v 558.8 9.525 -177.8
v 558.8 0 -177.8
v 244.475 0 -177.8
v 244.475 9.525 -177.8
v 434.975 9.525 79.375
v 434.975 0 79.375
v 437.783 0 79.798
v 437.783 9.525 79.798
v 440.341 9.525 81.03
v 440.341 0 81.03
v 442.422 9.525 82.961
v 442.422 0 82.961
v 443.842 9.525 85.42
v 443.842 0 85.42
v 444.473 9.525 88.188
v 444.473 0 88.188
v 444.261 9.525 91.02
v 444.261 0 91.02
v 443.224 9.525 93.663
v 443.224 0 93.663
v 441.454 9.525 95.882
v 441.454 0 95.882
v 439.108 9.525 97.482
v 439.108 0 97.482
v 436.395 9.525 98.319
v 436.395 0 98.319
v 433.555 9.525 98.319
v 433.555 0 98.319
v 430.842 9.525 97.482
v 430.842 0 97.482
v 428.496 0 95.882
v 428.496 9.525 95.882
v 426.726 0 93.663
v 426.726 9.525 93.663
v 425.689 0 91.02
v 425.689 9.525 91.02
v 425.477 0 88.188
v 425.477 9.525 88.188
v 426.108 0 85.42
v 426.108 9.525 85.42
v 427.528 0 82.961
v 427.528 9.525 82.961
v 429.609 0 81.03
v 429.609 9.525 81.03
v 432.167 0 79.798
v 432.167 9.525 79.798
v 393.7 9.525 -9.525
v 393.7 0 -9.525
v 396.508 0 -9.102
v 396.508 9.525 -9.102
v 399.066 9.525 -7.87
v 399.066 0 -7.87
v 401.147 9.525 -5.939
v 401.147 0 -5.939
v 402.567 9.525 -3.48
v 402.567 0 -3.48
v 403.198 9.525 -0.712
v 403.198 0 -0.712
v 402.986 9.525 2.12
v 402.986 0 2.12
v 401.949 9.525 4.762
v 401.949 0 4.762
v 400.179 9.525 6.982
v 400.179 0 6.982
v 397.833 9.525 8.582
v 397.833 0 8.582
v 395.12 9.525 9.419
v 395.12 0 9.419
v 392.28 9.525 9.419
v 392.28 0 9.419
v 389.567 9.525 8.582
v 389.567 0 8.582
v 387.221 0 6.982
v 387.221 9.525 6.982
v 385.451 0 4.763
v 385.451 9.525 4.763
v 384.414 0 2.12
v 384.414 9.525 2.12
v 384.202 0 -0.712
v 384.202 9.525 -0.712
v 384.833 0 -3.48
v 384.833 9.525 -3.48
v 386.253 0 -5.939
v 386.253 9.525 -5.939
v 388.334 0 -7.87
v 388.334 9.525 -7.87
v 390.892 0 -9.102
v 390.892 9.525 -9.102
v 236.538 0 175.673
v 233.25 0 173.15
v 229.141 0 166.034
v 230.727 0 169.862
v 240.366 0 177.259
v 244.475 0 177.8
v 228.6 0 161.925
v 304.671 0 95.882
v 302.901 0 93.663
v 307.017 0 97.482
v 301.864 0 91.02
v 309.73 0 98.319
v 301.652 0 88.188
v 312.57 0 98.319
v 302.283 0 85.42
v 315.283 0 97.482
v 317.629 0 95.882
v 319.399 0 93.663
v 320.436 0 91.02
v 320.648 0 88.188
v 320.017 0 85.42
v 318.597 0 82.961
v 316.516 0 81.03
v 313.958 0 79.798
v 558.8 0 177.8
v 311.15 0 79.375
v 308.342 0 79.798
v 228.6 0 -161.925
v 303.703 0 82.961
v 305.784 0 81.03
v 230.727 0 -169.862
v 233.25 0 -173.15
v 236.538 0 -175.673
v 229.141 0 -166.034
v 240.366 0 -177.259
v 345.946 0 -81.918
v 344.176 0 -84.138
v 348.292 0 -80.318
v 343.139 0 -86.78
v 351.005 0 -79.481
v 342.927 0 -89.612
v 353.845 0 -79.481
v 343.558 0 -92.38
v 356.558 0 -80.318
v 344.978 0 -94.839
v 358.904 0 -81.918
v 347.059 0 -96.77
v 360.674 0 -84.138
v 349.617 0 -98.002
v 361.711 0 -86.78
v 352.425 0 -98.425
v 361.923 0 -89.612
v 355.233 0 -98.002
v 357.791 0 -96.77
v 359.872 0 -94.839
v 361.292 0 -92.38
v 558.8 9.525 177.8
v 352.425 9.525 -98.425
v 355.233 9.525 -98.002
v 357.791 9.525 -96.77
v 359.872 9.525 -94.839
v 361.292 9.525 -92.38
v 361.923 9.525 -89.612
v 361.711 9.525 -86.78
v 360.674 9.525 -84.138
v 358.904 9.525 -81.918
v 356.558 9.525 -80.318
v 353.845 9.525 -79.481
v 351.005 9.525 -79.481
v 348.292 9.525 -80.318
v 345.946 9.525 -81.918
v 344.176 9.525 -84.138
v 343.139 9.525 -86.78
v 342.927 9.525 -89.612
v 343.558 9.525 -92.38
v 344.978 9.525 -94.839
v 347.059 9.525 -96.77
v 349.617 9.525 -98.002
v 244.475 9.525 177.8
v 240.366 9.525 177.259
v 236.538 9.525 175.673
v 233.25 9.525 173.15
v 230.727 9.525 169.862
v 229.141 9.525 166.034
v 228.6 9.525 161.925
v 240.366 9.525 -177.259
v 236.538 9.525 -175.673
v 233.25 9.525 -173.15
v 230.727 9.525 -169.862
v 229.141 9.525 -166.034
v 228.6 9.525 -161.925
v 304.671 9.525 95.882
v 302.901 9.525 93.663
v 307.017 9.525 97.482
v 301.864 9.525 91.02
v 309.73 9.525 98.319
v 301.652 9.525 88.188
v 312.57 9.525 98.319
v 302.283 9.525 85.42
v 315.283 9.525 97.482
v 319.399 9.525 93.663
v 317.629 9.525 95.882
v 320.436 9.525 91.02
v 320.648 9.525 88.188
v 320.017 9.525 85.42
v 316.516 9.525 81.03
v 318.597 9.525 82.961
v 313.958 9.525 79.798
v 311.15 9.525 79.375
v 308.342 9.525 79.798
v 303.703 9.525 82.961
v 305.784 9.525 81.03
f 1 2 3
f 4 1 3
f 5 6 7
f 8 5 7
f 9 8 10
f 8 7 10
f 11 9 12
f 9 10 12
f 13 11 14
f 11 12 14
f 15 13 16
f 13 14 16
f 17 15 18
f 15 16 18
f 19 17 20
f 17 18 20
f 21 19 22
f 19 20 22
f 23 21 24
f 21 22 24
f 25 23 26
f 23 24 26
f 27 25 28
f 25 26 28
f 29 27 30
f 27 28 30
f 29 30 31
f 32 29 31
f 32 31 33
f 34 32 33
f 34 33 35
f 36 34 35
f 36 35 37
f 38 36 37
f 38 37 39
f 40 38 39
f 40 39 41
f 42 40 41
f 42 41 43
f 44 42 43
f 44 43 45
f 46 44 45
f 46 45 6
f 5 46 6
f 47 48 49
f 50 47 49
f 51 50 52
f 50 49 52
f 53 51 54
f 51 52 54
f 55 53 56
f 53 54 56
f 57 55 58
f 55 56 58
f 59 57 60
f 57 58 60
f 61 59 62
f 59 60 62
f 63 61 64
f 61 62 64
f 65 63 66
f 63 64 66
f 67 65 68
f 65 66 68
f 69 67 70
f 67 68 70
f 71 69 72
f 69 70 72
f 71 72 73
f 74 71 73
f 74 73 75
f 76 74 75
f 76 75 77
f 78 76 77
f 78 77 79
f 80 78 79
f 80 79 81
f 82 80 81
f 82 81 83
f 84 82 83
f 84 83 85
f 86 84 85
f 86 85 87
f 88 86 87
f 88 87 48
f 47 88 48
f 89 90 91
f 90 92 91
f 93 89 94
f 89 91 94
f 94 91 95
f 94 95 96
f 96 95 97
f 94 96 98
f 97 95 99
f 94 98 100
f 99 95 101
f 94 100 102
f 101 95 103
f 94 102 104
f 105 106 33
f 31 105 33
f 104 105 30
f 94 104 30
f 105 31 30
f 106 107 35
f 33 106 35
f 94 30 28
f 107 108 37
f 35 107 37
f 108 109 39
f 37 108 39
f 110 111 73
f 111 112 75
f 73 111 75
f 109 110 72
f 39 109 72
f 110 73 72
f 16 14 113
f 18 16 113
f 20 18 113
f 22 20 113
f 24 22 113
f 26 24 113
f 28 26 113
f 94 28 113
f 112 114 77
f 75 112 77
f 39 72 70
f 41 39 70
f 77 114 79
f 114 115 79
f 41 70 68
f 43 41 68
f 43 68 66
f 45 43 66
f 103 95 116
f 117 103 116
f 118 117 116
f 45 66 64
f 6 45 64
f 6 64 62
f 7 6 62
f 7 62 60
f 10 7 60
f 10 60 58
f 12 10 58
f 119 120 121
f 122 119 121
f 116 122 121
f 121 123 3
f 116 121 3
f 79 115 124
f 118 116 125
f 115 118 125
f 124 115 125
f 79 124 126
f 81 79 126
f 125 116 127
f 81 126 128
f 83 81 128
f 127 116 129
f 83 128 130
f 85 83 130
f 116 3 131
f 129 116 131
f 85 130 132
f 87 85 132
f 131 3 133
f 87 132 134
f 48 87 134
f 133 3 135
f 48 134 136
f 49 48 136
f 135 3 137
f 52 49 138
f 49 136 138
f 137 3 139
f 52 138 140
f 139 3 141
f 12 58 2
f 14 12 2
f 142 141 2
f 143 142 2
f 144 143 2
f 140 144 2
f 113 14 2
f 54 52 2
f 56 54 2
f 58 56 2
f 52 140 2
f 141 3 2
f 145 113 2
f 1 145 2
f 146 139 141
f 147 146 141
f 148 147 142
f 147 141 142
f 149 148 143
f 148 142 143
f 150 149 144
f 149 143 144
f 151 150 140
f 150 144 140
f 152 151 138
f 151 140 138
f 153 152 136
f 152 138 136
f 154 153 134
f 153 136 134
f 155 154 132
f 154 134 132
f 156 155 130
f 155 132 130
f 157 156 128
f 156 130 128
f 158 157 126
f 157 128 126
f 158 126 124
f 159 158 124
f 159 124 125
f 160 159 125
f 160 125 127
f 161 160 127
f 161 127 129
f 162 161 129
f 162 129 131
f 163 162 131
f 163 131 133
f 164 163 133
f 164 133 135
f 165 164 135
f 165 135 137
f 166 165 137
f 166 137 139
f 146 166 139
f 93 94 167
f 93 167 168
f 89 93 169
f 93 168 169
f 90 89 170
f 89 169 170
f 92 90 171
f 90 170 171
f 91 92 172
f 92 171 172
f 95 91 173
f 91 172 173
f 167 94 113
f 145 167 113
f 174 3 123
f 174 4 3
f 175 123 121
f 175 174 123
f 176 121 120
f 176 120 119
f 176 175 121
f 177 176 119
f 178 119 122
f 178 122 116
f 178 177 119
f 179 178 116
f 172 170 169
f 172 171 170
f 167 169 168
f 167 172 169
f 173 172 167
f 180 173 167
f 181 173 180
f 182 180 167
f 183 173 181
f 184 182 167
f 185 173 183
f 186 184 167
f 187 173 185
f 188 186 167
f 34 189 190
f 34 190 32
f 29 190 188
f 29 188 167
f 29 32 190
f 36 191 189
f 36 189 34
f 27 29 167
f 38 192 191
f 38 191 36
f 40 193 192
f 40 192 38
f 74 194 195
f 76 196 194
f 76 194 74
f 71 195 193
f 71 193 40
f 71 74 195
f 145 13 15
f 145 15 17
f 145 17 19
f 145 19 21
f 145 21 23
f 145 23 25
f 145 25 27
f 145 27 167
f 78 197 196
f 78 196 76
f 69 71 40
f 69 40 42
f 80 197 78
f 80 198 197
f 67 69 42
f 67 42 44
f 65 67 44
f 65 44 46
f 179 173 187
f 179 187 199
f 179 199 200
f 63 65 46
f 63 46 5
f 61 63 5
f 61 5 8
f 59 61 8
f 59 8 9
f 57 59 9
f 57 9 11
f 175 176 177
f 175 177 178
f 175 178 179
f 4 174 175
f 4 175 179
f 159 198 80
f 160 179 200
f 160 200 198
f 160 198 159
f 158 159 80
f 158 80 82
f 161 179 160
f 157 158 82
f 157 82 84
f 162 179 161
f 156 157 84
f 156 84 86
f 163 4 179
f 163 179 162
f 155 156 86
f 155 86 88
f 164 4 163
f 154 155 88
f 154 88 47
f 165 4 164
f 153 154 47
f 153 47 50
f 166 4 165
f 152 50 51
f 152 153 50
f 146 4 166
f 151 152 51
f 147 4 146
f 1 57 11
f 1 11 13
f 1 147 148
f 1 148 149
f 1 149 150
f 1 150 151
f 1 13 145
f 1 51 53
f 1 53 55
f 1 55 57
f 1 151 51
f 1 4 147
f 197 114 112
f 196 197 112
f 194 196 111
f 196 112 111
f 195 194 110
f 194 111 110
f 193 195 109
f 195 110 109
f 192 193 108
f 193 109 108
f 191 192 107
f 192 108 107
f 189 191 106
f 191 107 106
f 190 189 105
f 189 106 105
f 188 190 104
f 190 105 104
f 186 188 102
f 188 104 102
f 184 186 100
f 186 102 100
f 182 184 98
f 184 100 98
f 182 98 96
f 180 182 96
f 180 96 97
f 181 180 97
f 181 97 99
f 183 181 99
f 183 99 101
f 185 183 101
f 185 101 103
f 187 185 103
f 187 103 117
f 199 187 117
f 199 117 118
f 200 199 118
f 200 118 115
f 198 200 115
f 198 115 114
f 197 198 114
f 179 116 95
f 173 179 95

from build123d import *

# Parameters (mm, degrees)
BOSS_EXTRUDE1_DEPTH = 9.525
BOSS_EXTRUDE2_DEPTH = 9.525
SKETCH3_R           = 9.525
CUT_EXTRUDE6_DEPTH  = 587.481888574
FILLET1_R           = 15.875


with BuildPart() as part:
    # Sketch1 → Boss-Extrude1 (new body)
    with BuildSketch(Plane(origin=(0, 0, 0), x_dir=(1, 0, 0), z_dir=(0, 1, 0))):
        Polygon((461.512355724, 17.636671785), (558.8, 99.270698215), (558.8, 177.8), (228.6, 177.8), (228.6, -177.8), align=None)
    extrude(amount=BOSS_EXTRUDE1_DEPTH)

    # Sketch1<4> → Boss-Extrude2 (add)
    with BuildSketch(Plane(origin=(0, 0, 0), x_dir=(1, 0, 0), z_dir=(0, 1, 0))):
        Polygon((558.8, -177.8), (558.8, 99.270698215), (461.512355724, 17.636671785), (228.6, -177.8), align=None)
    extrude(amount=BOSS_EXTRUDE2_DEPTH)

    # Sketch3 → Cut-Extrude6 (cut, through all)
    with BuildSketch(Plane.XZ):
        with Locations((393.7, 0)):
            Circle(SKETCH3_R)
        with Locations((352.425, -88.9)):
            Circle(SKETCH3_R)
        with Locations((311.15, 88.9)):
            Circle(SKETCH3_R)
        with Locations((434.975, 88.9)):
            Circle(SKETCH3_R)
    extrude(amount=-CUT_EXTRUDE6_DEPTH, mode=Mode.SUBTRACT)

    # Fillet1
    fillet1_edges = [part.edges().sort_by_distance(p)[0] for p in [
        (228.6, 4.7625, 177.8),
        (228.6, 4.7625, -177.8),
    ]]
    fillet(fillet1_edges, radius=FILLET1_R)


solid = part.part
